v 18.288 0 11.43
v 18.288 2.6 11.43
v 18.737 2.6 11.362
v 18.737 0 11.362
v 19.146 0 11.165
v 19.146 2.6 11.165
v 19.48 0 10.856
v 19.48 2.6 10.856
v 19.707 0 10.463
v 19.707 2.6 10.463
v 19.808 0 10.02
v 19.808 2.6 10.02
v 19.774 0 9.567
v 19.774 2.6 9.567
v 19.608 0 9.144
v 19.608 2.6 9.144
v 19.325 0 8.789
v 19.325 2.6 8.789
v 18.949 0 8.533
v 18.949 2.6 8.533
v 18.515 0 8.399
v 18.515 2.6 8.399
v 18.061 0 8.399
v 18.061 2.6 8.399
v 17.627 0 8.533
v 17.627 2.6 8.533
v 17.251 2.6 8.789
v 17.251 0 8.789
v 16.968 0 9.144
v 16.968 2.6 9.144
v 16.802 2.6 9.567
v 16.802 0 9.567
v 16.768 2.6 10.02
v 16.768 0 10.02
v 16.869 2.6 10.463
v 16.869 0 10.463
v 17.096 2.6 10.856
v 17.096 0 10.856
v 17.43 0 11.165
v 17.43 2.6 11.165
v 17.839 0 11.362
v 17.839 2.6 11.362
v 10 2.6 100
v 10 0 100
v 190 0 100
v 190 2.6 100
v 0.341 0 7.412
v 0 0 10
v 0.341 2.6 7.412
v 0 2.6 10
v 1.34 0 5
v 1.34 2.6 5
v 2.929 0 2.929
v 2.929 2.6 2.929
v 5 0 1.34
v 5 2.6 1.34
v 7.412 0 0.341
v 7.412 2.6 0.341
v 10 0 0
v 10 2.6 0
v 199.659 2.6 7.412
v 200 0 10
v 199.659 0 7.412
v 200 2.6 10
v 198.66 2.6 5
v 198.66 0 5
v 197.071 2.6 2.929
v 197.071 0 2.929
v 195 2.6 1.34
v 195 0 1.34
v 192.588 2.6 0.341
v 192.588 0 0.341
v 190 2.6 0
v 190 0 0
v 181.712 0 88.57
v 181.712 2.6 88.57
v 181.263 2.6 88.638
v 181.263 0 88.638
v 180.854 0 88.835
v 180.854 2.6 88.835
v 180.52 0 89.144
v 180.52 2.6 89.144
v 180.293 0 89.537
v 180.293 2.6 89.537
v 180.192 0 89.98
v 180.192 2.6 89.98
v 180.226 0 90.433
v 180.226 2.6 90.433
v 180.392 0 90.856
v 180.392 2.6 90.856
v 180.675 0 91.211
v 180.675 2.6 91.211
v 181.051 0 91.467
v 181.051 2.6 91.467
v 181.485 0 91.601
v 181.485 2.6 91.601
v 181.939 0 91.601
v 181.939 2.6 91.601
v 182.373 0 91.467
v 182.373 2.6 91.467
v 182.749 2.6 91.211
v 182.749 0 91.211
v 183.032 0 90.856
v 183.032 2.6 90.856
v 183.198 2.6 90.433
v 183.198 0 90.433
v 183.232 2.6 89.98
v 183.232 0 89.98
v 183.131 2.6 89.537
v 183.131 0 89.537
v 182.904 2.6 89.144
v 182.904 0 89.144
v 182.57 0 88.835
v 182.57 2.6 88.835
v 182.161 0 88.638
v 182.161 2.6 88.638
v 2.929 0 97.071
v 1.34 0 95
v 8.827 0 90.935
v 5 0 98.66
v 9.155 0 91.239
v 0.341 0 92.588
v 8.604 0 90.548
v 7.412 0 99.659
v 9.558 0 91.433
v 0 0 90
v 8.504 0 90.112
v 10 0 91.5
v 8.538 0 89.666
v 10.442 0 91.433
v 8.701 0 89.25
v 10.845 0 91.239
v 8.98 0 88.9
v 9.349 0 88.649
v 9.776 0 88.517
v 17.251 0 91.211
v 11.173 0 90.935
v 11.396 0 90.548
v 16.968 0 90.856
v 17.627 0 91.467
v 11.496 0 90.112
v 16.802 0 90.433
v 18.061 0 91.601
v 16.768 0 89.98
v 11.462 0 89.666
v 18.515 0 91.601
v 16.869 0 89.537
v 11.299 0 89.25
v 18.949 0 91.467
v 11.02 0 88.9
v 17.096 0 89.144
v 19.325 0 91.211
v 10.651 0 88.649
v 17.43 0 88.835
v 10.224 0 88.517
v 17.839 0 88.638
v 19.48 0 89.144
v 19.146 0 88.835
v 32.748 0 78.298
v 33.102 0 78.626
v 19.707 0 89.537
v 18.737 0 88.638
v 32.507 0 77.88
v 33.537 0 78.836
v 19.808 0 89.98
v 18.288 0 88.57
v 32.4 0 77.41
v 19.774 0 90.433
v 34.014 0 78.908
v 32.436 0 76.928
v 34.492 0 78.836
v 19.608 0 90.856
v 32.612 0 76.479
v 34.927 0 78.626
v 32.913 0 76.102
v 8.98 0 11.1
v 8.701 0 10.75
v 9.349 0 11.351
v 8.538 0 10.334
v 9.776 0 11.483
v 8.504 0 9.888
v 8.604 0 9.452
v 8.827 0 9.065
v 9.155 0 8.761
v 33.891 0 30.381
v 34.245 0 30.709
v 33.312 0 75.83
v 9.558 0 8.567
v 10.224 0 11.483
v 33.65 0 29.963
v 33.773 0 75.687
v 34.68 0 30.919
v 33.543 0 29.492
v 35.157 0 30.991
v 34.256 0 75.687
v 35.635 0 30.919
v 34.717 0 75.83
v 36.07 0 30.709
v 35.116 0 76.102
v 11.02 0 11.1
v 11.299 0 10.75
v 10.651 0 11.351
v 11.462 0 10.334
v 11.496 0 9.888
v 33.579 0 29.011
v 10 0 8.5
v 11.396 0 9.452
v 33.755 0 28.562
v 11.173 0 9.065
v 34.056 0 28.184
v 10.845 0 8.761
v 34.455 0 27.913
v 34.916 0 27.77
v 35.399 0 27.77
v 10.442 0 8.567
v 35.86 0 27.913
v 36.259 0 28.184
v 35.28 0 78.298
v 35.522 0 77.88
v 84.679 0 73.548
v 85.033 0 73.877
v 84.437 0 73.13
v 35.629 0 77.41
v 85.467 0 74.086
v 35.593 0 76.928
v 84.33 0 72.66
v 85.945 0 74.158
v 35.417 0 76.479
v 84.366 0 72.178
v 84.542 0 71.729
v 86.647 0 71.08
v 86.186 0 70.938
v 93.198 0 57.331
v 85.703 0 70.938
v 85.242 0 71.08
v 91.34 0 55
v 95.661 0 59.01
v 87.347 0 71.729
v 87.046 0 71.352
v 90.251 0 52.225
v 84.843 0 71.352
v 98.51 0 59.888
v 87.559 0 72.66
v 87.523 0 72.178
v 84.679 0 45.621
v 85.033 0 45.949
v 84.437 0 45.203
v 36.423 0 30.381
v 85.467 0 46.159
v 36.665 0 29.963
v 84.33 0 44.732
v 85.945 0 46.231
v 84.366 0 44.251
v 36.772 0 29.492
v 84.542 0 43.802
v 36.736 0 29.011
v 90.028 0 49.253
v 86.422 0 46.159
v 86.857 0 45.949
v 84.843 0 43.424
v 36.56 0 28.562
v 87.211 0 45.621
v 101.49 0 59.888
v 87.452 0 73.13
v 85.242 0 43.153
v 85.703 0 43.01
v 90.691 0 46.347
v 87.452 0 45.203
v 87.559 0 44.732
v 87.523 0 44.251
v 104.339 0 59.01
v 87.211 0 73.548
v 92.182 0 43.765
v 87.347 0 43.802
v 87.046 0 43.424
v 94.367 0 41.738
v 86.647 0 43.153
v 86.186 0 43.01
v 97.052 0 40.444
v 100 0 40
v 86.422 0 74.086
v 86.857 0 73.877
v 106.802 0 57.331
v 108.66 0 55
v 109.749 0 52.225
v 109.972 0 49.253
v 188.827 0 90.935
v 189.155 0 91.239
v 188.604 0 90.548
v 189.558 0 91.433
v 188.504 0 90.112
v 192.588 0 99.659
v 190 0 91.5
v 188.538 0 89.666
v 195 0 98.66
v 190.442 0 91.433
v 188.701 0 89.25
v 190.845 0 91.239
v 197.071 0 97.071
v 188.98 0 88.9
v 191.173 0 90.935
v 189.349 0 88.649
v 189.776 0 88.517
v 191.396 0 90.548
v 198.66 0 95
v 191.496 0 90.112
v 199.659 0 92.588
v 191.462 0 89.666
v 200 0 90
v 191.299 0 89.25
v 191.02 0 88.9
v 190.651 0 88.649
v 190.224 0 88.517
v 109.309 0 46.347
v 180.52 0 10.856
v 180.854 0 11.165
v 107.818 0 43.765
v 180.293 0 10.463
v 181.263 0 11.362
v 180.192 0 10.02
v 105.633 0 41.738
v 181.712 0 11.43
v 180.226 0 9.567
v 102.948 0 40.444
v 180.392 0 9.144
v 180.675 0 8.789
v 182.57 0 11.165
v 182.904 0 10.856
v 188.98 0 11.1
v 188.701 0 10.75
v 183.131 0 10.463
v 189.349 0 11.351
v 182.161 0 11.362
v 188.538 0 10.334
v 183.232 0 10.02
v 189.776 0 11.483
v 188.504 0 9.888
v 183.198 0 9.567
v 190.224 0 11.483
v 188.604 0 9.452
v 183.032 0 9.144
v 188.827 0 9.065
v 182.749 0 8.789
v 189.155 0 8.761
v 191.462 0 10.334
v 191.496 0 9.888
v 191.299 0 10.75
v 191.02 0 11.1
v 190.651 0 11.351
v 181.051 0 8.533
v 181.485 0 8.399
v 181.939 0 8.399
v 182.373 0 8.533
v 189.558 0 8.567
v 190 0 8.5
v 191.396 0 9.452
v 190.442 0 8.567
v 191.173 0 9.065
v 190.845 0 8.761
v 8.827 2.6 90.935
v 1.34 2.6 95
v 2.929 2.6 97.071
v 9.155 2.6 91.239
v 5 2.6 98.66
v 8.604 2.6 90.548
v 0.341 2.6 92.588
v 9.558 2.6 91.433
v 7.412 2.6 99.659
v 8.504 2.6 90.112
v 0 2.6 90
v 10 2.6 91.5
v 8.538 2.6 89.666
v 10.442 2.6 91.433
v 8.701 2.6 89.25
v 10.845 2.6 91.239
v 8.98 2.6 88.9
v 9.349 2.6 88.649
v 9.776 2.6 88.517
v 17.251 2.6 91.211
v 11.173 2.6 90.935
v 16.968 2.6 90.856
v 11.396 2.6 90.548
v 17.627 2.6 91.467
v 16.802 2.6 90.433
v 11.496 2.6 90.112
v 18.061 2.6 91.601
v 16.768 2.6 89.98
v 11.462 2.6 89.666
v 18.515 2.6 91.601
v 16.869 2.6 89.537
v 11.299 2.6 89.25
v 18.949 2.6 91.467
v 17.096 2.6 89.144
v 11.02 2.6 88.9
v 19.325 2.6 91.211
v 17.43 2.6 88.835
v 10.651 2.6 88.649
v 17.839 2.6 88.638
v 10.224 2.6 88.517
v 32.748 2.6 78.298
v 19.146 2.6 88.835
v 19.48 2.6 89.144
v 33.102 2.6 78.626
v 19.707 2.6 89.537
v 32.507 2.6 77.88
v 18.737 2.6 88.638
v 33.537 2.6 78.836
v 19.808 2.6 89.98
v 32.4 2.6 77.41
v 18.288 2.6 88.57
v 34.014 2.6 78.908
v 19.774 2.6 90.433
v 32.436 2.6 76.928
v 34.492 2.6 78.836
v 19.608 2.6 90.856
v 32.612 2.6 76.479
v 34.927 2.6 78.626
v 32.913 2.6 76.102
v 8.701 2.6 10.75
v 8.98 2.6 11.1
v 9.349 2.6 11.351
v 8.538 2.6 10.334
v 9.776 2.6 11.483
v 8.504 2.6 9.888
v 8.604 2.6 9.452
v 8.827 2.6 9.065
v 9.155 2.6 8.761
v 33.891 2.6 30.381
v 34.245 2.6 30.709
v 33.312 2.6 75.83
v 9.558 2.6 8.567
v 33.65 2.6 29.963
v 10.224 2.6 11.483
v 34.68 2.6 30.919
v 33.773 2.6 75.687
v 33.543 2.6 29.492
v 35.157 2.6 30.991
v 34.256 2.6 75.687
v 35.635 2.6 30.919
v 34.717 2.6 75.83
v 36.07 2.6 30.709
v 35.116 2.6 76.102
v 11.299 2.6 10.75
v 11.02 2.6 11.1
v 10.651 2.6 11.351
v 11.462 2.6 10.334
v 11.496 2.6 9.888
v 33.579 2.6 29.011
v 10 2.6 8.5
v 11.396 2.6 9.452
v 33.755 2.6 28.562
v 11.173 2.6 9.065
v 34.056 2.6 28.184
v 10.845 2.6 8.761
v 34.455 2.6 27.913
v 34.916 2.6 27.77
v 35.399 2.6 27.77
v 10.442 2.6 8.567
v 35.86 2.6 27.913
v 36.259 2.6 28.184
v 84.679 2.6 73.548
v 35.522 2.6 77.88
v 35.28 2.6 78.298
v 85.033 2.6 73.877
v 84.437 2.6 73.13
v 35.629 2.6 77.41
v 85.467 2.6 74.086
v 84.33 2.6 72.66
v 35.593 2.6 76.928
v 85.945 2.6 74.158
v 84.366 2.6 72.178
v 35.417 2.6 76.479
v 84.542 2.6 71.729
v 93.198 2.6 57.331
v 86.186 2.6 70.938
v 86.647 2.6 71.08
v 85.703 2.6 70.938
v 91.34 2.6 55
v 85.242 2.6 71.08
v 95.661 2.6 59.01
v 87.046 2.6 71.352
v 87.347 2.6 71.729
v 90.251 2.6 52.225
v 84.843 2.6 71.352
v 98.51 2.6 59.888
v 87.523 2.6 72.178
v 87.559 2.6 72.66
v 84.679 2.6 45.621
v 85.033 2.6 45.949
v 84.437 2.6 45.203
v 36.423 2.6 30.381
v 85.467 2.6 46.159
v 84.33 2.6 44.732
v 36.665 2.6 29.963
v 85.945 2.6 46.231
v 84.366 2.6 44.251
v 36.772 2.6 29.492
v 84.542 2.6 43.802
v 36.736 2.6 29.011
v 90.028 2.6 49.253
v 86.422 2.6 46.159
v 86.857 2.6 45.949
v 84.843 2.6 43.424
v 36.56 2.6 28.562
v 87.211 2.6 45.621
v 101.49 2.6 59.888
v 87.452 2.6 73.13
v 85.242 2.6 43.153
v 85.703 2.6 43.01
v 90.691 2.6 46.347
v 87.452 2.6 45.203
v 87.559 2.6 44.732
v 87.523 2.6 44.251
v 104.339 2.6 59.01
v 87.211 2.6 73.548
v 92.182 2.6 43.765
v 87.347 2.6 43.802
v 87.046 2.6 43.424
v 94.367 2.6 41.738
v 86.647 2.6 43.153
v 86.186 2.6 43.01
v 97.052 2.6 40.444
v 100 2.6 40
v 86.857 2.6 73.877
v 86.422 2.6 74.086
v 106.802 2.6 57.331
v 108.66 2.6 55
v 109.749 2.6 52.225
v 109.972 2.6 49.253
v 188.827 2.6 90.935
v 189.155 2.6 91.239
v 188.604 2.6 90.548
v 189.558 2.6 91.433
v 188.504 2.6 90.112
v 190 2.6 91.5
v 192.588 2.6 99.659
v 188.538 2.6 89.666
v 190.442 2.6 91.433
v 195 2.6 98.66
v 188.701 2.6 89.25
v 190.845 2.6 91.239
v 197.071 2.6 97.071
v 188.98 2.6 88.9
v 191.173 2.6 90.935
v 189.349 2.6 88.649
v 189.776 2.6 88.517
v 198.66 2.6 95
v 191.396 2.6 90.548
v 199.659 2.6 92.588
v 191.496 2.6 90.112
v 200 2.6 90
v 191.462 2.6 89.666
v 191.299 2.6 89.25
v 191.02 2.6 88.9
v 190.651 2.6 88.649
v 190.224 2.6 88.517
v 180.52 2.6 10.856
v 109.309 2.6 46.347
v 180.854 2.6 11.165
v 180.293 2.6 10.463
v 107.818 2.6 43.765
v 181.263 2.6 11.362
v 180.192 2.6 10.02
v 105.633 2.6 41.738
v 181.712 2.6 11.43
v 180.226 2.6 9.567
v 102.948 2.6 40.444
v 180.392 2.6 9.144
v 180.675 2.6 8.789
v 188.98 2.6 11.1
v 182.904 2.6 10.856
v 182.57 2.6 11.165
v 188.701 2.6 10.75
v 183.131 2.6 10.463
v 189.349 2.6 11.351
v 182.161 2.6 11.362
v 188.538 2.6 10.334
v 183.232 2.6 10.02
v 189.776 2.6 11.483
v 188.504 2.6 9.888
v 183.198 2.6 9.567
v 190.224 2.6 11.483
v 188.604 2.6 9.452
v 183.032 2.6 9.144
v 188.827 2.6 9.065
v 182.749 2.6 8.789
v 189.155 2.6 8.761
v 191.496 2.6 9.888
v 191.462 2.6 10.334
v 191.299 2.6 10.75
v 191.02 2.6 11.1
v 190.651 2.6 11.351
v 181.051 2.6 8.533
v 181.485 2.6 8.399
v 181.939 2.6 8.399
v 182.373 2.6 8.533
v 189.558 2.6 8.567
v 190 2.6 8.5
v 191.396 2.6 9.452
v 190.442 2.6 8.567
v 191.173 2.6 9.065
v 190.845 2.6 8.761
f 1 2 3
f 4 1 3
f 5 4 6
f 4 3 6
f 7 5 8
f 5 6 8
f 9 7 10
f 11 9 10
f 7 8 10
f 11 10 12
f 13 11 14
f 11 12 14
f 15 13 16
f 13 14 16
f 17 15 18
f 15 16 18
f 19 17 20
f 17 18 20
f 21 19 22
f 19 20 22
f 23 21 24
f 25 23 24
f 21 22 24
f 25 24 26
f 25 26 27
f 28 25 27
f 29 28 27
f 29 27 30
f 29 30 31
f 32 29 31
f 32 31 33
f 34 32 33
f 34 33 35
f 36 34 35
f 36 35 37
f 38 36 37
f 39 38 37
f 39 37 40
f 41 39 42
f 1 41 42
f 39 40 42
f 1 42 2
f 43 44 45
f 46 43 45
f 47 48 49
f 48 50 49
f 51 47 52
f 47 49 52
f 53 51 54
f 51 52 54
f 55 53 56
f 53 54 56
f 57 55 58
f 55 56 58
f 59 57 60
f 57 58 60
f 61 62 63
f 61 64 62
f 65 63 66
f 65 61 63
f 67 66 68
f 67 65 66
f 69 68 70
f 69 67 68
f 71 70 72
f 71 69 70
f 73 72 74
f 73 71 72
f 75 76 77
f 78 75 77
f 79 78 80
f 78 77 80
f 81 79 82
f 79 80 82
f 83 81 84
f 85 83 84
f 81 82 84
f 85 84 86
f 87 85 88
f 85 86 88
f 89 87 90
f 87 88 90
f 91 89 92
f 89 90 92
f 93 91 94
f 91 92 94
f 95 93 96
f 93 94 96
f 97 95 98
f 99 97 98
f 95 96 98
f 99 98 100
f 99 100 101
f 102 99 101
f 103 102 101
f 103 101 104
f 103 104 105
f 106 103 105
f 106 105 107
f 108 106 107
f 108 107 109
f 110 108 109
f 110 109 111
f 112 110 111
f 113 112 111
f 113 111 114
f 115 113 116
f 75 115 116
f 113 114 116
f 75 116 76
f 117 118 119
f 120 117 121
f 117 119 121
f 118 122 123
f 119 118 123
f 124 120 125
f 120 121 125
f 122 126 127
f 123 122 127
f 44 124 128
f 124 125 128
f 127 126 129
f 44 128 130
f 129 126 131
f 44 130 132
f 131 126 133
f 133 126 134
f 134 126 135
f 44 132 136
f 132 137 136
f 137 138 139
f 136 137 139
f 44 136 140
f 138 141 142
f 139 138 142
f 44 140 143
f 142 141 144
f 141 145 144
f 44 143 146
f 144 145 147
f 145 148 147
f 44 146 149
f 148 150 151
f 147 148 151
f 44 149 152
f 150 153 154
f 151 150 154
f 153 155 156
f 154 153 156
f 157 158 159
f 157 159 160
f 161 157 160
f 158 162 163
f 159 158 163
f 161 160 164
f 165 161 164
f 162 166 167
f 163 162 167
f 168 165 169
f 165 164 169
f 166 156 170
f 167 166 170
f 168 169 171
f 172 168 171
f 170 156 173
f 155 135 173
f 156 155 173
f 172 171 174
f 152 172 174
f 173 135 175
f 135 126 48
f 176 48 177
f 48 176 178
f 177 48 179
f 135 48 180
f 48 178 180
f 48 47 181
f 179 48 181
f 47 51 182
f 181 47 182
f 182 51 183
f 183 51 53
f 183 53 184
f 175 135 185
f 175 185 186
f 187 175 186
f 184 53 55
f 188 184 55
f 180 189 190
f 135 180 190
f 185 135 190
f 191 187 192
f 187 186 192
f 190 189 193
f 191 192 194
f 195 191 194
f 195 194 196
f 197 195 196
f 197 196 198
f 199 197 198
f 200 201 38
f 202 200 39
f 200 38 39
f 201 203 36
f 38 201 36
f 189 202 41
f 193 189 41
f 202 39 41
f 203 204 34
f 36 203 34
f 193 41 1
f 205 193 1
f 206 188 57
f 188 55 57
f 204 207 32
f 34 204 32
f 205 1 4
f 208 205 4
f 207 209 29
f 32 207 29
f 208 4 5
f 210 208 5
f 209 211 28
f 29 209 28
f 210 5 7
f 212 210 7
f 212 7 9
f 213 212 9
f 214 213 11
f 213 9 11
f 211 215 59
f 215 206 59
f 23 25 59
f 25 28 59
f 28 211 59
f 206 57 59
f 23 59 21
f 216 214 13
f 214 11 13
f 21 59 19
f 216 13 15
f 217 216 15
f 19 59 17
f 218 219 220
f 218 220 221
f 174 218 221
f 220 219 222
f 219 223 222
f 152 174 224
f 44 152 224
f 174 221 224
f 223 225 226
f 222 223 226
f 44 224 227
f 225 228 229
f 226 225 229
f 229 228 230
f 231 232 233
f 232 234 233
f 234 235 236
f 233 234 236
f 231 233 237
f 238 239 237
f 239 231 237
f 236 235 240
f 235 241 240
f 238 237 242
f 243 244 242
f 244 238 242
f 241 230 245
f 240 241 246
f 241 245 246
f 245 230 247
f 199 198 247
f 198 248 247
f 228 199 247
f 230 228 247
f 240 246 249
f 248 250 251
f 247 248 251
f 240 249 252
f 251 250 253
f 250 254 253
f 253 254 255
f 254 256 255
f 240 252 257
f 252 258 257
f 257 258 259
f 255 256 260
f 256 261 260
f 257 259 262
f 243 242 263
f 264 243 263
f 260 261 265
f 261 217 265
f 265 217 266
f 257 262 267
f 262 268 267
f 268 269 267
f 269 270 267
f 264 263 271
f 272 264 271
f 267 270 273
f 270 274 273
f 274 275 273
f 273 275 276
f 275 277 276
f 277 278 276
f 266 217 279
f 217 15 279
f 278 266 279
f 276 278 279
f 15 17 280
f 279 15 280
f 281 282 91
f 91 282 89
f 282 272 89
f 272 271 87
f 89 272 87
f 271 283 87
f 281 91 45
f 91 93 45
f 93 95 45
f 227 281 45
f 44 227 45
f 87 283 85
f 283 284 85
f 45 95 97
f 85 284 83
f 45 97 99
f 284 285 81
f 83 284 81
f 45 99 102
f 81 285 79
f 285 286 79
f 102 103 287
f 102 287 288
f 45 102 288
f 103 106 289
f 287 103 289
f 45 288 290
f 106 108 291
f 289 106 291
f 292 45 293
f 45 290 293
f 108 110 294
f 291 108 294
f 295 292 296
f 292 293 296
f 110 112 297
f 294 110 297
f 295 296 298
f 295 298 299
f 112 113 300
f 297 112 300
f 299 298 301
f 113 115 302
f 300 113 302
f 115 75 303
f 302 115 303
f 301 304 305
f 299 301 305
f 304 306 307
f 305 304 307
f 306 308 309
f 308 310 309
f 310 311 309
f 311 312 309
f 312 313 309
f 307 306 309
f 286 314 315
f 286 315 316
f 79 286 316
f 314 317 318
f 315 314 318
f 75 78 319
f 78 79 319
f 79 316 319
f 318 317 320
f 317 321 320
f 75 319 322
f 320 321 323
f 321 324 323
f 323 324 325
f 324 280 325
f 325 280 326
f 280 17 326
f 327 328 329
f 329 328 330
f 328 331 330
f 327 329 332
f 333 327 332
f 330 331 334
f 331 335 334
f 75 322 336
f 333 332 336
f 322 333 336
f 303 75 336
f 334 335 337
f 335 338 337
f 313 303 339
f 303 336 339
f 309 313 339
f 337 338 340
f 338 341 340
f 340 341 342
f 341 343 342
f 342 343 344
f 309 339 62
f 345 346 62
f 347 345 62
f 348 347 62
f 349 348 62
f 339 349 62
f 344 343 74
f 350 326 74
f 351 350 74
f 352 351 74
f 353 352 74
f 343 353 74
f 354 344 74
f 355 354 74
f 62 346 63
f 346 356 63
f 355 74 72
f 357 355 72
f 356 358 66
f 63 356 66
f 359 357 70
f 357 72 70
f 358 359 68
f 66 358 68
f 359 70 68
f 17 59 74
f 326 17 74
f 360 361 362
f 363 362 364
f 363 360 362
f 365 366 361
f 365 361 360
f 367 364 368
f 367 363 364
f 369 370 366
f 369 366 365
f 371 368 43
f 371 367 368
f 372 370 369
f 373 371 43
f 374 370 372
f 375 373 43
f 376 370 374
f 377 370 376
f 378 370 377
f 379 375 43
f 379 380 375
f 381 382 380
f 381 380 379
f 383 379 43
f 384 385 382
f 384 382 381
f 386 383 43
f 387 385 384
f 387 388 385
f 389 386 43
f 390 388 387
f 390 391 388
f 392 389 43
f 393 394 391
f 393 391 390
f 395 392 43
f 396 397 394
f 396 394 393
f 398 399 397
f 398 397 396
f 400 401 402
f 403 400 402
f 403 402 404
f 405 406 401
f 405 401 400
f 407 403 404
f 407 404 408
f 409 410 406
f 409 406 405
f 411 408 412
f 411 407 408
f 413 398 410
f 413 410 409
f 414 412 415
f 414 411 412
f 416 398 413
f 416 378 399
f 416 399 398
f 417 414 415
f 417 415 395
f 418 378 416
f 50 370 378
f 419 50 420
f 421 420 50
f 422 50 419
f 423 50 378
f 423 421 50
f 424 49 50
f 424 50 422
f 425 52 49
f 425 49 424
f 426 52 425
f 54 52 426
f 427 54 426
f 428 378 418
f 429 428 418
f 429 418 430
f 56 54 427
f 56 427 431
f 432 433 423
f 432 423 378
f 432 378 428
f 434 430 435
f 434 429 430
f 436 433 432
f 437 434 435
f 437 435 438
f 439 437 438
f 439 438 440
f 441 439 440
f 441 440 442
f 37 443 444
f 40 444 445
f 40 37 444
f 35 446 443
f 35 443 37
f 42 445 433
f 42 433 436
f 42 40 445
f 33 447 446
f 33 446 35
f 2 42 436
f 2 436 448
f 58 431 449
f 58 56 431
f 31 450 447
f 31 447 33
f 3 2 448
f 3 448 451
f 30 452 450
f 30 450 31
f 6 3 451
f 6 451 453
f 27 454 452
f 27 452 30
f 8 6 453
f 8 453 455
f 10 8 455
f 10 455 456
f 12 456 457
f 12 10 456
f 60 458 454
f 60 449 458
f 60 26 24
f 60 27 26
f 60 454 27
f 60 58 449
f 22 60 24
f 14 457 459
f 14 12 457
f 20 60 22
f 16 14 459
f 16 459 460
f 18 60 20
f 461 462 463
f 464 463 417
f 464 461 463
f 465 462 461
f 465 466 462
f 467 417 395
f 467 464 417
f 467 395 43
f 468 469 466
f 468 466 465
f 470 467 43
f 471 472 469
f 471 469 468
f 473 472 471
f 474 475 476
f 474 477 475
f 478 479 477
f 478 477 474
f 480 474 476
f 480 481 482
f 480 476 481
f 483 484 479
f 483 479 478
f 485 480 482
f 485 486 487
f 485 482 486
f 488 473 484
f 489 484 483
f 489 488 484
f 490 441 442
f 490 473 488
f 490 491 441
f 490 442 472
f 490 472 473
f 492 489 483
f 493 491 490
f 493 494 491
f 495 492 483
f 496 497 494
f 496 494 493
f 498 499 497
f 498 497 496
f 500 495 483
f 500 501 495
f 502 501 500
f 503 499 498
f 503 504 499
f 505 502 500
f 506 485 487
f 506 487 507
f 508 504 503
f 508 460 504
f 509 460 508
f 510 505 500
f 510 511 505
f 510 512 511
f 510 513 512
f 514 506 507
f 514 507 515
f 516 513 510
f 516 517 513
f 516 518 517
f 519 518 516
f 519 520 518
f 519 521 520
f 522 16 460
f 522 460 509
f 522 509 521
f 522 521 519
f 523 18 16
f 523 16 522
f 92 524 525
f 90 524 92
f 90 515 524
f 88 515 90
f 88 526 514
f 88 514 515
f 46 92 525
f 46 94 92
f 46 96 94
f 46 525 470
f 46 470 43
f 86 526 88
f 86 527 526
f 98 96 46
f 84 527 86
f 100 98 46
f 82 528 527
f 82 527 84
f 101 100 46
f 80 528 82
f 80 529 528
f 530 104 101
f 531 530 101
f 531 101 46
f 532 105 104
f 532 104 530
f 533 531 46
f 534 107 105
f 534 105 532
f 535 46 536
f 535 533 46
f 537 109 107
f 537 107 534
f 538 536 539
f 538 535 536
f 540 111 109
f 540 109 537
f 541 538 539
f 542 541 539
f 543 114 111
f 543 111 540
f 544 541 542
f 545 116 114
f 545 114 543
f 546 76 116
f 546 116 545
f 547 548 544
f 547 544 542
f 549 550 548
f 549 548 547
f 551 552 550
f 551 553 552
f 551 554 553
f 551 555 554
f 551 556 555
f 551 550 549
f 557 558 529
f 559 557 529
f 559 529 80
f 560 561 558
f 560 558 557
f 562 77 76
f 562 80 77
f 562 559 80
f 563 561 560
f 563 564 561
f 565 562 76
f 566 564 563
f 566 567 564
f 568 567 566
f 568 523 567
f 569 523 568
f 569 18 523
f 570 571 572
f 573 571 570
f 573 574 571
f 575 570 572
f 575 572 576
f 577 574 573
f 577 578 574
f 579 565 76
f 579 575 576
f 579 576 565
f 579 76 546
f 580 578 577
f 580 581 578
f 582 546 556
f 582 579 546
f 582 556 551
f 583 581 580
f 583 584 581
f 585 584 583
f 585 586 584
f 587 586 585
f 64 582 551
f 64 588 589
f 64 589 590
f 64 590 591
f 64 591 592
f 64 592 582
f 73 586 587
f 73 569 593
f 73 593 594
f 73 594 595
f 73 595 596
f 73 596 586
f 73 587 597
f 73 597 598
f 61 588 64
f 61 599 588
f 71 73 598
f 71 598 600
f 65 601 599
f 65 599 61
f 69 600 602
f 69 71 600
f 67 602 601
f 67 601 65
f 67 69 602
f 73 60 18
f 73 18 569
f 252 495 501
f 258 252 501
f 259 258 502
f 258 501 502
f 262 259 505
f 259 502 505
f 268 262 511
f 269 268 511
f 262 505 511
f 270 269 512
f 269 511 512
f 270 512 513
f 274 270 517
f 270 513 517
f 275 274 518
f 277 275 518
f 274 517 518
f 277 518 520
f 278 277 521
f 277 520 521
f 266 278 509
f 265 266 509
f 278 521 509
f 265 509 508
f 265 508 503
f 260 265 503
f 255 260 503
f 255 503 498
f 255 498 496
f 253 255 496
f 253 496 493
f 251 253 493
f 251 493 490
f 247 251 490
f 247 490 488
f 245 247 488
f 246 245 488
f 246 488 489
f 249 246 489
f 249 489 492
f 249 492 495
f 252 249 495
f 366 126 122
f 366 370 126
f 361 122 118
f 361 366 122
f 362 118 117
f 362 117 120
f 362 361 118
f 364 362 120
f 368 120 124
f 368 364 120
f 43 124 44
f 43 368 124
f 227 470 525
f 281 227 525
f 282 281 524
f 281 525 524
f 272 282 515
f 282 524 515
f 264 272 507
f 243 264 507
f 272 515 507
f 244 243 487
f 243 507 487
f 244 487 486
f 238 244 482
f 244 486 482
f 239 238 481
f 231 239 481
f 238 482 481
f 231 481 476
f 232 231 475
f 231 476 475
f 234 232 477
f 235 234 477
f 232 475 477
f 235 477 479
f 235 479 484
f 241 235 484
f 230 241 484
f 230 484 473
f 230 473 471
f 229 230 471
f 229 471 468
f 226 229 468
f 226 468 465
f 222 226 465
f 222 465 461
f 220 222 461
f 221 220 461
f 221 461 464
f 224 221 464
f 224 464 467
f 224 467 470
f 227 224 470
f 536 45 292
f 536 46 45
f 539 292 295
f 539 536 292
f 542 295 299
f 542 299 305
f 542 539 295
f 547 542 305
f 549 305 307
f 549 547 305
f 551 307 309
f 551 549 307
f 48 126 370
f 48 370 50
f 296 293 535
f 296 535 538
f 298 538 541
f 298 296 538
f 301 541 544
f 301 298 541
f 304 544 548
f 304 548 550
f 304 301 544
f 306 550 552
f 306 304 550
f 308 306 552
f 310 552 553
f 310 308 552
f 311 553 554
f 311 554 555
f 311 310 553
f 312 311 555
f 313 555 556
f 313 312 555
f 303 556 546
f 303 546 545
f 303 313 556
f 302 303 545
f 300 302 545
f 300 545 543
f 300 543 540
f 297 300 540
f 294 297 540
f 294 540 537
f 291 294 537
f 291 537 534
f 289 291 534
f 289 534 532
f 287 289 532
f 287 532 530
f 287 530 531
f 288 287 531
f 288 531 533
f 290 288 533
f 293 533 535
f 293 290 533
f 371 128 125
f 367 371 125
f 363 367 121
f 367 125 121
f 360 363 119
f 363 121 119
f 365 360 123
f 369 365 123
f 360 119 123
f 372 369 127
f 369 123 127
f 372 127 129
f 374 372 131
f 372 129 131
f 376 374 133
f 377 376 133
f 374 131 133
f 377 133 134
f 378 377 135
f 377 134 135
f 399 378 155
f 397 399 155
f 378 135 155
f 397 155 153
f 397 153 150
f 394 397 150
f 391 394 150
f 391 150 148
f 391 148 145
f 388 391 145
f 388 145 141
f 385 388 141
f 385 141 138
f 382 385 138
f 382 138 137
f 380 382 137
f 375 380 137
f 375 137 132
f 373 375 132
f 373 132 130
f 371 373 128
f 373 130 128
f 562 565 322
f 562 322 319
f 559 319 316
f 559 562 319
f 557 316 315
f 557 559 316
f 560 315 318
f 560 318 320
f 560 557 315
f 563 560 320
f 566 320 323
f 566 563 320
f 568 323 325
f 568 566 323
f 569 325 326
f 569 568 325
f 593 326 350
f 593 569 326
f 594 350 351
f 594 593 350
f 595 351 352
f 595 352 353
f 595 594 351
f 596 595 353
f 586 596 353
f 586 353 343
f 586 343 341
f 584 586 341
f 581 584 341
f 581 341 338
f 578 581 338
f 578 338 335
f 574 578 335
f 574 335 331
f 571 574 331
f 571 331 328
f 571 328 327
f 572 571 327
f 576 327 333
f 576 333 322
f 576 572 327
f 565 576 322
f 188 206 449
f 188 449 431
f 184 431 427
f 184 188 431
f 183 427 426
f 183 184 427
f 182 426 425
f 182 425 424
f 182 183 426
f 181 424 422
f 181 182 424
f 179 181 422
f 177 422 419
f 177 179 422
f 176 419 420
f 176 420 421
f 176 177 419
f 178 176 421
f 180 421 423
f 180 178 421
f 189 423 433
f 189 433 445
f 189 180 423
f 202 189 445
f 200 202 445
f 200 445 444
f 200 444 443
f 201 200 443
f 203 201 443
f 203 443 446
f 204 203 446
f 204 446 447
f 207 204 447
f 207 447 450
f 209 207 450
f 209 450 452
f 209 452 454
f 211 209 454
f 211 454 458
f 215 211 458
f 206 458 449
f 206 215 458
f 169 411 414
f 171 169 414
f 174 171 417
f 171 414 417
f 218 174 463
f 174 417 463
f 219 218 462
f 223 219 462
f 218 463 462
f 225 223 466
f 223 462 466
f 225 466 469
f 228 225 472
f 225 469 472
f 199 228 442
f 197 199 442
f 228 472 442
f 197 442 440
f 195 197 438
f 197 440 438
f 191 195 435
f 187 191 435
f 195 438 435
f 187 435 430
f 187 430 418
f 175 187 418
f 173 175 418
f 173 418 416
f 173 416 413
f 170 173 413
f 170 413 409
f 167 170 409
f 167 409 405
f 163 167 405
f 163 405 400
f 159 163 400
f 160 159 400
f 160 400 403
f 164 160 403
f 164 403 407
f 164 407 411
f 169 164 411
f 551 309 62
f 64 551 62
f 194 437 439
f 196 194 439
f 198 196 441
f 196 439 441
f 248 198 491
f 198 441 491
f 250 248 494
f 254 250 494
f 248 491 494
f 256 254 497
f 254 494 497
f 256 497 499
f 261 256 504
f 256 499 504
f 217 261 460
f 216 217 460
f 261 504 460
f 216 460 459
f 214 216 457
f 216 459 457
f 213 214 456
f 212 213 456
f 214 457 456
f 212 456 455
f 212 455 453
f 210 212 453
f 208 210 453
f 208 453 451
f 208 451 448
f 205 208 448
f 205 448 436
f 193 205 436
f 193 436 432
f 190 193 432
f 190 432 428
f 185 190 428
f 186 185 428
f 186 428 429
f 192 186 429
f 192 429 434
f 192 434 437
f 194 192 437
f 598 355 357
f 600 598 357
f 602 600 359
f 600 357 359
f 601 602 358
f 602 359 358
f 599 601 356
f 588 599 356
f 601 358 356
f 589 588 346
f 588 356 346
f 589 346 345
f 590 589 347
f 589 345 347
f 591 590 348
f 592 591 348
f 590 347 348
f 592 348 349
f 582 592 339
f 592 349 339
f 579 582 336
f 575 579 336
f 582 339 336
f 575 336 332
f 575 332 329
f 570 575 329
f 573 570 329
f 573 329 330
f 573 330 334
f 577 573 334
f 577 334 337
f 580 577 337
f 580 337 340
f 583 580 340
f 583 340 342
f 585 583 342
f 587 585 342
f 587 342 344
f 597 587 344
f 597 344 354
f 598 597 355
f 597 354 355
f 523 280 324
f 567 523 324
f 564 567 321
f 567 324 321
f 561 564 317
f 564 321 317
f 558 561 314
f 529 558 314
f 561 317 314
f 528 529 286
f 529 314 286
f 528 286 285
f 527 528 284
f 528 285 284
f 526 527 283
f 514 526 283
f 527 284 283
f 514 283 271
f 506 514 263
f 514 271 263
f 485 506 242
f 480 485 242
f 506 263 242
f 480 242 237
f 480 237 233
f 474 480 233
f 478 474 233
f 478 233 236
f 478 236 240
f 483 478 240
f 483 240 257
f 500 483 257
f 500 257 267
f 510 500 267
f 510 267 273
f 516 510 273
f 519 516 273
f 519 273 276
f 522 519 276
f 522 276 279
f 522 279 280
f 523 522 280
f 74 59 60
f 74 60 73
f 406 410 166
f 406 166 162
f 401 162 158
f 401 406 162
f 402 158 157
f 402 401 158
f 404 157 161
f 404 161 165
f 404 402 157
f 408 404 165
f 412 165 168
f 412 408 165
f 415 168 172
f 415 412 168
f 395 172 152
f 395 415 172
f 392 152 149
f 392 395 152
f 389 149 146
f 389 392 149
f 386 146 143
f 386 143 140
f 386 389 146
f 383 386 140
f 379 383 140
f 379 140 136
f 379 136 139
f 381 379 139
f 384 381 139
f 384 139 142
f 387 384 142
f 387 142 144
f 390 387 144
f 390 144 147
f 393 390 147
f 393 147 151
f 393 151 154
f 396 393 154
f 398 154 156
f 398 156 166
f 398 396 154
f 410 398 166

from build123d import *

# Parameters (mm, degrees)
SKETCH1_W               = 200
SKETCH1_H               = 100
BOSS_EXTRUDE1_DEPTH     = 2.6
FILLET1_R               = 10
SKETCH6_R               = 1.5
CUT_EXTRUDE6_DEPTH      = 2.6
MIRROR6_COPY_1_SKETCH_R = 1.5
MIRROR6_COPY_1_DEPTH    = 2.6
SKETCH16_R              = 1.61925
CUT_EXTRUDE9_DEPTH      = 10
SKETCH17_R              = 1.61925
CUT_EXTRUDE10_DEPTH     = 224.621913059
SKETCH18_R              = 1.61925
CUT_EXTRUDE11_DEPTH     = 224.621913059
SKETCH19_R              = 1.61925
CUT_EXTRUDE12_DEPTH     = 224.621913059
SKETCH15_R              = 10
CUT_EXTRUDE14_DEPTH     = 224.621913059
SKETCH23_R              = 1.524
CUT_EXTRUDE15_DEPTH     = 2.59999988
MIRROR8_COPY_1_SKETCH_R = 1.524
MIRROR8_COPY_1_DEPTH    = 2.59999988


with BuildPart() as part:
    # Sketch1 → Boss-Extrude1 (new body)
    with BuildSketch(Plane(origin=(0, 0, 0), x_dir=(1, 0, 0), z_dir=(0, 1, 0))):
        with Locations((100, -50)):
            Rectangle(SKETCH1_W, SKETCH1_H)
    extrude(amount=BOSS_EXTRUDE1_DEPTH)

    # Fillet1
    fillet1_edges = [part.edges().sort_by_distance(p)[0] for p in [
        (0, 1.3, 0),
        (200, 1.3, 0),
        (200, 1.3, 100),
        (0, 1.3, 100),
    ]]
    fillet(fillet1_edges, radius=FILLET1_R)

    # Sketch6 → Cut-Extrude6 (cut)
    with BuildSketch(Plane.XZ):
        with Locations(Location((190, 10, 0), (0, 0, 270))):
            Circle(SKETCH6_R)
    cut_extrude6 = extrude(amount=-CUT_EXTRUDE6_DEPTH, mode=Mode.SUBTRACT)

    # Mirror5: Cut-Extrude6 across plane
    add(cut_extrude6.mirror(Plane(origin=(100, 0, 0), x_dir=(0, 0, 1), z_dir=(1, 0, 0))), mode=Mode.SUBTRACT)

    # Mirror6: Cut-Extrude6 across plane
    add(cut_extrude6.mirror(Plane.XY.offset(50)), mode=Mode.SUBTRACT)

    # Mirror6 copy 1 sketch → Mirror6 copy 1 (cut)
    with BuildSketch(Plane(origin=(200, 0, 100), x_dir=(-1, 0, 0), z_dir=(0, -1, 0))):
        with Locations(Location((190, 10, 0), (0, 0, 270))):
            Circle(MIRROR6_COPY_1_SKETCH_R)
    extrude(amount=-MIRROR6_COPY_1_DEPTH, mode=Mode.SUBTRACT)

    # Sketch16 → Cut-Extrude9 (cut)
    with BuildSketch(Plane(origin=(0, 2.6, 0), x_dir=(1, 0, 0), z_dir=(0, 1, 0))):
        with Locations(Location((35.15745, -29.37145, 0), (0, 0, 270))):
            Circle(SKETCH16_R)
    extrude(amount=-CUT_EXTRUDE9_DEPTH, mode=Mode.SUBTRACT)

    # Sketch17 → Cut-Extrude10 (cut, through all)
    with BuildSketch(Plane(origin=(0, 2.6, 0), x_dir=(1, 0, 0), z_dir=(0, 1, 0))):
        with Locations(Location((85.94475, -44.61145, 0), (0, 0, 270))):
            Circle(SKETCH17_R)
    extrude(amount=-CUT_EXTRUDE10_DEPTH, mode=Mode.SUBTRACT)

    # Sketch18 → Cut-Extrude11 (cut, through all)
    with BuildSketch(Plane(origin=(0, 2.6, 0), x_dir=(1, 0, 0), z_dir=(0, 1, 0))):
        with Locations(Location((34.01445, -77.28855, 0), (0, 0, 270))):
            Circle(SKETCH18_R)
    extrude(amount=-CUT_EXTRUDE11_DEPTH, mode=Mode.SUBTRACT)

    # Sketch19 → Cut-Extrude12 (cut, through all)
    with BuildSketch(Plane(origin=(0, 2.6, 0), x_dir=(1, 0, 0), z_dir=(0, 1, 0))):
        with Locations(Location((85.94475, -72.53875, 0), (0, 0, 270))):
            Circle(SKETCH19_R)
    extrude(amount=-CUT_EXTRUDE12_DEPTH, mode=Mode.SUBTRACT)

    # Sketch15 → Cut-Extrude14 (cut, through all)
    with BuildSketch(Plane.XZ):
        with Locations(Location((100, 50, 0), (0, 0, 270))):
            Circle(SKETCH15_R)
    extrude(amount=-CUT_EXTRUDE14_DEPTH, mode=Mode.SUBTRACT)

    # Sketch23 → Cut-Extrude15 (cut)
    with BuildSketch(Plane(origin=(0, 2.6, 0), x_dir=(1, 0, 0), z_dir=(0, 1, 0))):
        with Locations(Location((18.288, -9.906, 0), (0, 0, 270))):
            Circle(SKETCH23_R)
    cut_extrude15 = extrude(amount=-CUT_EXTRUDE15_DEPTH, mode=Mode.SUBTRACT)

    # Mirror7: Cut-Extrude15 across plane
    add(cut_extrude15.mirror(Plane(origin=(100, 0, 0), x_dir=(0, 0, 1), z_dir=(1, 0, 0))), mode=Mode.SUBTRACT)

    # Mirror8: Cut-Extrude15 across plane
    add(cut_extrude15.mirror(Plane.XY.offset(50)), mode=Mode.SUBTRACT)

    # Mirror8 copy 1 sketch → Mirror8 copy 1 (cut)
    with BuildSketch(Plane(origin=(200, 2.6, 100), x_dir=(-1, 0, 0), z_dir=(0, 1, 0))):
        with Locations(Location((18.288, -9.906, 0), (0, 0, 270))):
            Circle(MIRROR8_COPY_1_SKETCH_R)
    extrude(amount=-MIRROR8_COPY_1_DEPTH, mode=Mode.SUBTRACT)


solid = part.part
